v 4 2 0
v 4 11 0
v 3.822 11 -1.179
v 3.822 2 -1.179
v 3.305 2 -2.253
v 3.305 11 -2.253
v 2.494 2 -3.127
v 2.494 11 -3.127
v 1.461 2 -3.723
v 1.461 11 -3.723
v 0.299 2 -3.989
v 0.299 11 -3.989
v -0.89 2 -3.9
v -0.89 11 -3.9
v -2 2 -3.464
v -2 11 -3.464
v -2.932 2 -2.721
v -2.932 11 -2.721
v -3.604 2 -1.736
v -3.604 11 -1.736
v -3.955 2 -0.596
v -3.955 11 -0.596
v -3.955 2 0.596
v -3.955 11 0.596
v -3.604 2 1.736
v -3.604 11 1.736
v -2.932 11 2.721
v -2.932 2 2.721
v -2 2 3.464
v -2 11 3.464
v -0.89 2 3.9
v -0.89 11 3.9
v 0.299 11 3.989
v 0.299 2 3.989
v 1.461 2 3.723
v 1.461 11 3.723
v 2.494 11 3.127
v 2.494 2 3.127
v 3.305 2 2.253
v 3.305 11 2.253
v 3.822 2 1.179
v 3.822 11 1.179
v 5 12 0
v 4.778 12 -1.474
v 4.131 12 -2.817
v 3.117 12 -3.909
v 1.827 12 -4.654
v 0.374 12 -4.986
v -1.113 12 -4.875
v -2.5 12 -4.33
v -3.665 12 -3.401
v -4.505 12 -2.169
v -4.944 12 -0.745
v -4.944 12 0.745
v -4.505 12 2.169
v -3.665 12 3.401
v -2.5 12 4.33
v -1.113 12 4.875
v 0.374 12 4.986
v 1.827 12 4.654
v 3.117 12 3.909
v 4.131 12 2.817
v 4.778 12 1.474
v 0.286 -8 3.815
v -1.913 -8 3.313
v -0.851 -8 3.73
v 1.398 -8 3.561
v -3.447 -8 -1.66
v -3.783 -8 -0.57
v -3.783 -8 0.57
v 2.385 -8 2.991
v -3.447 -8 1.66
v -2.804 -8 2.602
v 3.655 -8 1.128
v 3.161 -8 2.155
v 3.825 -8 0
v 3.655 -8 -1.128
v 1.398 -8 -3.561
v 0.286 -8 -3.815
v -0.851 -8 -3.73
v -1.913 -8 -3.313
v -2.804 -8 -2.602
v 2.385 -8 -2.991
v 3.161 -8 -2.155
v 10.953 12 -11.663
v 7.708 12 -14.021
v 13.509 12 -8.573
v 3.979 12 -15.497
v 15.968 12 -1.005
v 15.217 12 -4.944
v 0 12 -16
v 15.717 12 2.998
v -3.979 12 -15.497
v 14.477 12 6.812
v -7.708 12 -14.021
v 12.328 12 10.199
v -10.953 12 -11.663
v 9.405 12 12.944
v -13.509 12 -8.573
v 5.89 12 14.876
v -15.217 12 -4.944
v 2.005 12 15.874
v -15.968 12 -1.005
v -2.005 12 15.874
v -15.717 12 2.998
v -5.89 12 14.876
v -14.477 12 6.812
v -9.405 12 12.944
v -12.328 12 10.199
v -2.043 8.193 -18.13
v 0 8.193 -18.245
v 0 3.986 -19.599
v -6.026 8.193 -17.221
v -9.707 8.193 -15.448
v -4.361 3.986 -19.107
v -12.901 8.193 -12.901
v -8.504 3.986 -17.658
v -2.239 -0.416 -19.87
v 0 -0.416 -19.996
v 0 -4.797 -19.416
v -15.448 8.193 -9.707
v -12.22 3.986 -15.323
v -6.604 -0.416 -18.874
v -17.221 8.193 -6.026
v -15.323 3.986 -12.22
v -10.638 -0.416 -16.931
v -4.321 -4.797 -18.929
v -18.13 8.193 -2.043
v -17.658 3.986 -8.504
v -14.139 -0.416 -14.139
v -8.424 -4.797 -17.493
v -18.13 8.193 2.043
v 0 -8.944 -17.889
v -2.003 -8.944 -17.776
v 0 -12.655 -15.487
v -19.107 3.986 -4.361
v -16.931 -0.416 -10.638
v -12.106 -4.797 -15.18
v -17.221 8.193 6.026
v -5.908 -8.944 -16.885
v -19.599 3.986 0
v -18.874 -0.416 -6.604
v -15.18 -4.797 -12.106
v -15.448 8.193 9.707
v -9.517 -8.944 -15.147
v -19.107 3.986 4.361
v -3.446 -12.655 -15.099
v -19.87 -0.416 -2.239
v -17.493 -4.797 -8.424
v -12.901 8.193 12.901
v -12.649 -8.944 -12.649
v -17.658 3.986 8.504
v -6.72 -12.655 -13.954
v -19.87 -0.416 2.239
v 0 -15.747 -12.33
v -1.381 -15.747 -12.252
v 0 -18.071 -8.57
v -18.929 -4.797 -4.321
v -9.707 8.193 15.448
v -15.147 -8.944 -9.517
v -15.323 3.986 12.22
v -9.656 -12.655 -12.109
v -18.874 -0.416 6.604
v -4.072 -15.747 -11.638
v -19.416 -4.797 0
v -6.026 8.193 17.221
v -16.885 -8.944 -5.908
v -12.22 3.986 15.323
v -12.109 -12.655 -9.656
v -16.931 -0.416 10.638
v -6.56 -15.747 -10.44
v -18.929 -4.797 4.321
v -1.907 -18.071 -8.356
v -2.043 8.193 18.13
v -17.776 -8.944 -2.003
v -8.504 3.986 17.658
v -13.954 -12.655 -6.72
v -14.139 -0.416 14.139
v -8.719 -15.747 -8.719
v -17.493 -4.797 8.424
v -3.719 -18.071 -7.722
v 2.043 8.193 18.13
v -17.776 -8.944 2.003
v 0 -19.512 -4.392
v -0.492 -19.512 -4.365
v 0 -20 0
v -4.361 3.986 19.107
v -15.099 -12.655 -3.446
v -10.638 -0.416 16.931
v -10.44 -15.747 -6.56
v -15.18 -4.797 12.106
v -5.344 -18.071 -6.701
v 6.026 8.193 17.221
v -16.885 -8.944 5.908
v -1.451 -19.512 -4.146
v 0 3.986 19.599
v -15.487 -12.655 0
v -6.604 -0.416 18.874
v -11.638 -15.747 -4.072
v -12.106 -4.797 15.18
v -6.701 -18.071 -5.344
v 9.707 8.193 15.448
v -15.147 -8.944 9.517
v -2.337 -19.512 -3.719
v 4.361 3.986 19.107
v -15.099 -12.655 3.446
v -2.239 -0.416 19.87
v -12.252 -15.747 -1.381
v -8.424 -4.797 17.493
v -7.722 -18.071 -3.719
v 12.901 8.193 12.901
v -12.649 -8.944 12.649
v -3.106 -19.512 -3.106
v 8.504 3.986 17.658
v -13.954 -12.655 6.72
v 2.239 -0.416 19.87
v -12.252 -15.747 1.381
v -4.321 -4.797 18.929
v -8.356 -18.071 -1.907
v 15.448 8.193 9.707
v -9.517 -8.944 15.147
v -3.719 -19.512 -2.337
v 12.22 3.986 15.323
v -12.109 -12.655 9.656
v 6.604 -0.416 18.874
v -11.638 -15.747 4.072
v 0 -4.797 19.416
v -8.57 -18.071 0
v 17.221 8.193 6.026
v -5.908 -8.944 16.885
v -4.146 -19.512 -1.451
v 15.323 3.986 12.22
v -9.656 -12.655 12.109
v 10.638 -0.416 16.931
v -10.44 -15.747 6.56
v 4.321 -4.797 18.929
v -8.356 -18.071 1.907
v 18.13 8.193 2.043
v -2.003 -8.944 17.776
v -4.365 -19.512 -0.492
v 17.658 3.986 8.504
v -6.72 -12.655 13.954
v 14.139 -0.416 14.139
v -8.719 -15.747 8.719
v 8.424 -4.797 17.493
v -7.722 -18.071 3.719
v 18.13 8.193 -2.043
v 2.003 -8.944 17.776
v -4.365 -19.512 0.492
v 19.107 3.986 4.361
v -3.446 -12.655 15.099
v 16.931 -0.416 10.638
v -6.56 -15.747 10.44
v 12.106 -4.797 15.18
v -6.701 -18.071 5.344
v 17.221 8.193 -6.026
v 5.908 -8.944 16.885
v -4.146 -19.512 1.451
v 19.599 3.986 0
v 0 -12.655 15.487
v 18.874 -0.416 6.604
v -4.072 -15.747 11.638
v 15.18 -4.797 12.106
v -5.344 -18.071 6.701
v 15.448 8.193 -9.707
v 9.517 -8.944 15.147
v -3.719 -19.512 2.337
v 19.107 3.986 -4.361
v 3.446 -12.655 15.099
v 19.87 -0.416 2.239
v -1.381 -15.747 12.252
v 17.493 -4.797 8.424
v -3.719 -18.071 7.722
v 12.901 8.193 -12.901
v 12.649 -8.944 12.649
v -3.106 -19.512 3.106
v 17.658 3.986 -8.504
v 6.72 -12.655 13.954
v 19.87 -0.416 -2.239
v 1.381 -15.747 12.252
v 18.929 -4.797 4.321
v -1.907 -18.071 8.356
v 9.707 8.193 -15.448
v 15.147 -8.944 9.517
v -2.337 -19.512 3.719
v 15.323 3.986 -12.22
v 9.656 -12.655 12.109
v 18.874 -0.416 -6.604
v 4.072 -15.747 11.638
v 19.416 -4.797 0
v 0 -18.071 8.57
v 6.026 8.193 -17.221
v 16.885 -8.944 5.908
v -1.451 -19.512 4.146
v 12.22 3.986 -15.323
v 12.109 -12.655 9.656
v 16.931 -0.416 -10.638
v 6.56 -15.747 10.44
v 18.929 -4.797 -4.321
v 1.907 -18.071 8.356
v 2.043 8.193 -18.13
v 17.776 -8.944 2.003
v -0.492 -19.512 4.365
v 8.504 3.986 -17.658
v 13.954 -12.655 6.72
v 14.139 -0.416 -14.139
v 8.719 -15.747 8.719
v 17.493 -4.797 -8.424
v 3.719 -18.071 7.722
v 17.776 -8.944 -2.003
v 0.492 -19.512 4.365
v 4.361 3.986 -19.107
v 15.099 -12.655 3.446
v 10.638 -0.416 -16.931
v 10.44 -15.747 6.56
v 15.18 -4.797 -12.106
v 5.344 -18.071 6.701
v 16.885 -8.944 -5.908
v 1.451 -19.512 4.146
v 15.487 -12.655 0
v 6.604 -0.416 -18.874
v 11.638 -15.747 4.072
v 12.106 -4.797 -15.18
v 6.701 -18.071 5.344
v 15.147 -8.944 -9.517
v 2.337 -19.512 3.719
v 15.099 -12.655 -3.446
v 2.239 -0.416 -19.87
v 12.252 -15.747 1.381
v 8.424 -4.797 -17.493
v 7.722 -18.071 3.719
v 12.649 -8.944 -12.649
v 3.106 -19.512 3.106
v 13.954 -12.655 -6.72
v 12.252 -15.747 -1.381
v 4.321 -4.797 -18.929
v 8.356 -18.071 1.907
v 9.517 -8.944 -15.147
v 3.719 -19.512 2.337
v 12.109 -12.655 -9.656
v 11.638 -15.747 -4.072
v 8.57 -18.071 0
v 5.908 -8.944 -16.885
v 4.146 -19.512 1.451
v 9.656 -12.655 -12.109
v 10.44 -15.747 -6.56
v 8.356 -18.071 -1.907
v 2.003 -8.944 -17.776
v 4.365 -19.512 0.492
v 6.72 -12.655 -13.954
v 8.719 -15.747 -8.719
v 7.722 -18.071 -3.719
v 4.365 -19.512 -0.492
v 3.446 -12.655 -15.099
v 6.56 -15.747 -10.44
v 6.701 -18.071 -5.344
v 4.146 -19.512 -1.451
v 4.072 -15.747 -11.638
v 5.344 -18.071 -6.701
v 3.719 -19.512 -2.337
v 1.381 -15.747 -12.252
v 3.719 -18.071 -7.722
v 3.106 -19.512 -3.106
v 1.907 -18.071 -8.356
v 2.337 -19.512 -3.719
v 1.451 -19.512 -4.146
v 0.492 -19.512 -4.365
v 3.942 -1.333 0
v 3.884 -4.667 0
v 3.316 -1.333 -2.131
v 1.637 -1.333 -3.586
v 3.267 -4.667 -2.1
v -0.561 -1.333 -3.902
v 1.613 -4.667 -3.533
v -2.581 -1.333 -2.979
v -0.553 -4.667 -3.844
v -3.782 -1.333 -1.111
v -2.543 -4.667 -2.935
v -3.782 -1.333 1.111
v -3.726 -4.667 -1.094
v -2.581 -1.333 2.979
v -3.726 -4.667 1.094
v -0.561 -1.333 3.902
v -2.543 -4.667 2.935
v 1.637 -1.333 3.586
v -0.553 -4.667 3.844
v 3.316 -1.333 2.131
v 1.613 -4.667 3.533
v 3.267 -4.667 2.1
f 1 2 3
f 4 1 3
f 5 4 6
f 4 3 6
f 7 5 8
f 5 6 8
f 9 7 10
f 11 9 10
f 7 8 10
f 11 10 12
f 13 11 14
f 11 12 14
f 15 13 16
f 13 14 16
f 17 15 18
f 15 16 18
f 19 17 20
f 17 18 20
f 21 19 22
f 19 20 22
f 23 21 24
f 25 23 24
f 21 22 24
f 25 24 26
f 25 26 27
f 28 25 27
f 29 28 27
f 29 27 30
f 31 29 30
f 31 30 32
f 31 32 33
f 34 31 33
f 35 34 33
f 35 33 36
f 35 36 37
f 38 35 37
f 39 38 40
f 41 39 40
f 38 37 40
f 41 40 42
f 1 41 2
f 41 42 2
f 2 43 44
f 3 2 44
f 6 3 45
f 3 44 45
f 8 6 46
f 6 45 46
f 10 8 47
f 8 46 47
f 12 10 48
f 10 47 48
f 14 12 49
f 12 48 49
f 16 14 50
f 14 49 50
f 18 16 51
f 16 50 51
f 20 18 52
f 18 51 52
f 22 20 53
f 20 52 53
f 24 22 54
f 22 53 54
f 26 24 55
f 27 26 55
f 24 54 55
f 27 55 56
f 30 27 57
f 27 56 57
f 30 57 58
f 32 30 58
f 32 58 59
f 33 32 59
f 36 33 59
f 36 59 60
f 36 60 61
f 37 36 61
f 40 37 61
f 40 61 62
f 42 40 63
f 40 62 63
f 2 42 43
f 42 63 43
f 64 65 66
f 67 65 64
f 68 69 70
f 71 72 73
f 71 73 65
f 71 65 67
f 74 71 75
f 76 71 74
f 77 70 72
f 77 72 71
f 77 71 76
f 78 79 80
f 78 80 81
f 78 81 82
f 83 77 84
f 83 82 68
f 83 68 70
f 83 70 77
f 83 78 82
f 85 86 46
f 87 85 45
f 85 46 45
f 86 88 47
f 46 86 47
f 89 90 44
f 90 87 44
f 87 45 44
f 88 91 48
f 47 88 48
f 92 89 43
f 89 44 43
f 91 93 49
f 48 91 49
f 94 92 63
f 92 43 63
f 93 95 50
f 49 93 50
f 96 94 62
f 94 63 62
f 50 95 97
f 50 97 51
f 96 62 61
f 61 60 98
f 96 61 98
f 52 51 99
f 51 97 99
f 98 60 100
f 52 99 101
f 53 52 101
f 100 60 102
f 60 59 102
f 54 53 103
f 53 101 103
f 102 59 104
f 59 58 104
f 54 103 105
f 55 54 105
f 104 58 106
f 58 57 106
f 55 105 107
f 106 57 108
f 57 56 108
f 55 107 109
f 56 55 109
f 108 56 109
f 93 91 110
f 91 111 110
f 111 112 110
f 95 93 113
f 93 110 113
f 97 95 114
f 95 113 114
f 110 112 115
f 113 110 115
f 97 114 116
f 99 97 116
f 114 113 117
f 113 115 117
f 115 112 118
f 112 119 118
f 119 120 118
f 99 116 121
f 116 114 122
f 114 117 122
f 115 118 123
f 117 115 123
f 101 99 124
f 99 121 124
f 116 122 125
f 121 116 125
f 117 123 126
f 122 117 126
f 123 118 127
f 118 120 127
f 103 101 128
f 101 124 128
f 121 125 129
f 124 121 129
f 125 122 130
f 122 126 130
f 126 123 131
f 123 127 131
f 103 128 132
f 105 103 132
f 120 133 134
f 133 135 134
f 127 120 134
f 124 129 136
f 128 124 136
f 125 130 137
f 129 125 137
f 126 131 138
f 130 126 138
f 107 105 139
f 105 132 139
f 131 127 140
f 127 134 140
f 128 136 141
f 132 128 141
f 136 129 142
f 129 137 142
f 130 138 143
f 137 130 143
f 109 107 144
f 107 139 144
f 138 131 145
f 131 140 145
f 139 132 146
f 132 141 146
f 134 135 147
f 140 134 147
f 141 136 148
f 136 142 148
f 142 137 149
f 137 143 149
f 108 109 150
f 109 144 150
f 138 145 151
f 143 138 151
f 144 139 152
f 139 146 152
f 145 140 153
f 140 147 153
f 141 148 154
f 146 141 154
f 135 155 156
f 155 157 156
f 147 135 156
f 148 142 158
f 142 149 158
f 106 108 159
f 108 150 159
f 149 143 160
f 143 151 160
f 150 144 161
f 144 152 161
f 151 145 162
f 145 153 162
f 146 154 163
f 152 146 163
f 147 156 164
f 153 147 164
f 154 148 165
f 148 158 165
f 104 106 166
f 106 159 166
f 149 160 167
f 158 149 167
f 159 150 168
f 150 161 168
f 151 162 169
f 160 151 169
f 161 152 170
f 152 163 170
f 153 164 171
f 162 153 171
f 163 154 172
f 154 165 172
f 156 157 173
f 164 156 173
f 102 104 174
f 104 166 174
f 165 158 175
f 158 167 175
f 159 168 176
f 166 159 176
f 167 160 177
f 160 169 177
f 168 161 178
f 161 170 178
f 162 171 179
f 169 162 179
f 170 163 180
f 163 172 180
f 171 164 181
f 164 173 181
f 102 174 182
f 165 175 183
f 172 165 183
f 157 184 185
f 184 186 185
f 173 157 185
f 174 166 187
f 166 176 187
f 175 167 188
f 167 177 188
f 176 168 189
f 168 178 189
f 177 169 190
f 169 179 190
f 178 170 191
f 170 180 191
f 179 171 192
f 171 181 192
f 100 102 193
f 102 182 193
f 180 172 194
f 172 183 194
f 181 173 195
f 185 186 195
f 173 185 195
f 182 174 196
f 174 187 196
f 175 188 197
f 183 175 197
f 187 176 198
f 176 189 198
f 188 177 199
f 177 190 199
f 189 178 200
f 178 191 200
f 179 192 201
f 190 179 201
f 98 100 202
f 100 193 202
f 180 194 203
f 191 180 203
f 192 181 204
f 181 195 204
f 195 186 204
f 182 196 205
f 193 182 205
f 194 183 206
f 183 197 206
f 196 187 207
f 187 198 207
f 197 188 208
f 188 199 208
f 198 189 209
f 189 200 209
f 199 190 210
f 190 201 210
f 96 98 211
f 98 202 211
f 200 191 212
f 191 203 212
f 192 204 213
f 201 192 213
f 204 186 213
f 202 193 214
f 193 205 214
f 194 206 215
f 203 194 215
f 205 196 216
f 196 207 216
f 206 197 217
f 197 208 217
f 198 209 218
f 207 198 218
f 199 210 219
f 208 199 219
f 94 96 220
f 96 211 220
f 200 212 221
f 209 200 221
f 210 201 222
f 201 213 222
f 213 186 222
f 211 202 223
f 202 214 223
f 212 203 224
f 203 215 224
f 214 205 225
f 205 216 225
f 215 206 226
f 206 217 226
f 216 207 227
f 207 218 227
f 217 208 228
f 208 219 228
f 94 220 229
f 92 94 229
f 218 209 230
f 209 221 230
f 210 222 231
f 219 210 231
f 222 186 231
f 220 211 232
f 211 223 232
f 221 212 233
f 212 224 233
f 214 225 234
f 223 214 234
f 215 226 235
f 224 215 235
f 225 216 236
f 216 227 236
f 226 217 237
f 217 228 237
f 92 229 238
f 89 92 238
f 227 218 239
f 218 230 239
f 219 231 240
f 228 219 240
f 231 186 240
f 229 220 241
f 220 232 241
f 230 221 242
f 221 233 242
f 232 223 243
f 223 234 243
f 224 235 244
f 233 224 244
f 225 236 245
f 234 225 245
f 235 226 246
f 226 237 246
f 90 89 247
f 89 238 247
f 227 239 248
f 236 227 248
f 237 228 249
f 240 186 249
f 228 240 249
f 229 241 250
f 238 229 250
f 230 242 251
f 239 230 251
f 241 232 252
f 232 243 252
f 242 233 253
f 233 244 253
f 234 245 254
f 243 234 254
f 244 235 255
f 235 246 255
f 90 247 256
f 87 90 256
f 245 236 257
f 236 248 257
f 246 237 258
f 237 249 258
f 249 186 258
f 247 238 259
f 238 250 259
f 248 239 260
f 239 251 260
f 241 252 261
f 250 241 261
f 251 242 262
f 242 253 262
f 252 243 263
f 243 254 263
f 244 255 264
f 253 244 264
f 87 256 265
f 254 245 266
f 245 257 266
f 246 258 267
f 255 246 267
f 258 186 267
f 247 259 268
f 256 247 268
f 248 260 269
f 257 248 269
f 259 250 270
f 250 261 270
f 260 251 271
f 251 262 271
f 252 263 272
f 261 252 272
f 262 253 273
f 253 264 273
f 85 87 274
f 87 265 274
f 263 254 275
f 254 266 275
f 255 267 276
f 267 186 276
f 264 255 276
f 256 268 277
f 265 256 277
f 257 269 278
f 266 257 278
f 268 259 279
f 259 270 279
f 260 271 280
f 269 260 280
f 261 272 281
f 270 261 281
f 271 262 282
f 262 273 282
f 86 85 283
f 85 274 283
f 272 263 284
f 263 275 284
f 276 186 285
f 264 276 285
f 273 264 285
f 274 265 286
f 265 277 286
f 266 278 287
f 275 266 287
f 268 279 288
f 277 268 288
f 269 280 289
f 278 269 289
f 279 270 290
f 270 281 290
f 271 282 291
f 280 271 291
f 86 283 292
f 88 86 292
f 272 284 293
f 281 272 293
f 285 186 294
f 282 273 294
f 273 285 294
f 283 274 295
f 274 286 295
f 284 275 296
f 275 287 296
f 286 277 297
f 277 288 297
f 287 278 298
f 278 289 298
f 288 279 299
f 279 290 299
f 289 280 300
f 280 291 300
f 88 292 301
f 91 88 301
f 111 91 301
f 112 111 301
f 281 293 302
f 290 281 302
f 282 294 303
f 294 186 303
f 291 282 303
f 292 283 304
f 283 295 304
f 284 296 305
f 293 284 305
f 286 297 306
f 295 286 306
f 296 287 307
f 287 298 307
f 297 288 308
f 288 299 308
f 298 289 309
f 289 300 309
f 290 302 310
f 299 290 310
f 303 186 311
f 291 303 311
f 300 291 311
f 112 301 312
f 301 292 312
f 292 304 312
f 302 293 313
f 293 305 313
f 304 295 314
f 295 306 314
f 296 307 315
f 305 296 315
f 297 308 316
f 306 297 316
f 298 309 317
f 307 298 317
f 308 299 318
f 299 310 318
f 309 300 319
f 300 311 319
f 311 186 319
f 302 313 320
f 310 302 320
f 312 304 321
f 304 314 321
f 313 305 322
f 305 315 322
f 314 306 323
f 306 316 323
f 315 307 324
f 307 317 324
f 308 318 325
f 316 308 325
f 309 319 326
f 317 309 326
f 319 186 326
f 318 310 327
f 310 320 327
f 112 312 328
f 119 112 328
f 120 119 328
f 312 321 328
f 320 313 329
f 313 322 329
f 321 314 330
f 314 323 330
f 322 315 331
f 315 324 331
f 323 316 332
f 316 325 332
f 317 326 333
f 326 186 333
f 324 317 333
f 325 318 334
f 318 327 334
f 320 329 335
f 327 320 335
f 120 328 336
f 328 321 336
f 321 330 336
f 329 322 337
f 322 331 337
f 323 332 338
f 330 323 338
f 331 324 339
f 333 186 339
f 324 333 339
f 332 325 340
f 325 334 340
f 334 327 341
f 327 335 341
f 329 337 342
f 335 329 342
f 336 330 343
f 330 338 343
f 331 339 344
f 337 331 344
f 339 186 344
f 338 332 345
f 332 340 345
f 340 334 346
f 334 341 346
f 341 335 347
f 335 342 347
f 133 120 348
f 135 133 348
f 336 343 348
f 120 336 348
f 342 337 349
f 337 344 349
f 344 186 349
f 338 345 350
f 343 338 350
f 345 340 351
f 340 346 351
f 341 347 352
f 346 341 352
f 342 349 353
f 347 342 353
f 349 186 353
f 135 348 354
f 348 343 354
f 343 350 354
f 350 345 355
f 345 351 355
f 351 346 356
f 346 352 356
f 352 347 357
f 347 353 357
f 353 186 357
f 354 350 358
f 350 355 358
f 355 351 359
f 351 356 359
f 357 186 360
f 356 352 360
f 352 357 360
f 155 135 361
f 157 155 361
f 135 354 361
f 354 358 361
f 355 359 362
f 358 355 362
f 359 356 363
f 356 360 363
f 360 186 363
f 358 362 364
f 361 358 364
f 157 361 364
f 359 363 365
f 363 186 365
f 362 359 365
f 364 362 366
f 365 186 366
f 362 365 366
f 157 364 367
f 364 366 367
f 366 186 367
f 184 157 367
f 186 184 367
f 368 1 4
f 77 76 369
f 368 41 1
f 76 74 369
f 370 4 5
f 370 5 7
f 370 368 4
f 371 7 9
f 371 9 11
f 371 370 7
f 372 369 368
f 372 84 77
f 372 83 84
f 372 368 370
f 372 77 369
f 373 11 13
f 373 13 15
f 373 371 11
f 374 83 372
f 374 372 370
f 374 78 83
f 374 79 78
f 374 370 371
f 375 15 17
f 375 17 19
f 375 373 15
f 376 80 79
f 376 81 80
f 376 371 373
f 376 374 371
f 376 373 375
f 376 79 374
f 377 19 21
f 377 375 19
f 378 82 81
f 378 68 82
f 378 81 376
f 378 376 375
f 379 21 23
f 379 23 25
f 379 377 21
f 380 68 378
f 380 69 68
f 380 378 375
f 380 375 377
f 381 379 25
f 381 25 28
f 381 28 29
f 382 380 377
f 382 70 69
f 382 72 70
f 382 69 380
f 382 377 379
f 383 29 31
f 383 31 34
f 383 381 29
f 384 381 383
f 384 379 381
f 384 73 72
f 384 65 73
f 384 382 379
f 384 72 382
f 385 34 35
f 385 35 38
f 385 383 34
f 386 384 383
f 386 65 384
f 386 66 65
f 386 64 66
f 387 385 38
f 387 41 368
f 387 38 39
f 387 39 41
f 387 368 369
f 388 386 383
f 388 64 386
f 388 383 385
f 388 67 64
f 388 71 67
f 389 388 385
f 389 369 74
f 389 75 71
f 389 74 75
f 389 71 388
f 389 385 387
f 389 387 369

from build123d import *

# Parameters (mm, degrees)
SKETCH2_R          = 4
CUT_EXTRUDE1_DEPTH = 20
CHAMFER1_SIZE      = 10
CHAMFER1_SIZE2     = 0.174550649
CHAMFER2_SIZE      = 1


with BuildPart() as part:
    # Sketch1 → Revolve2 (revolve)
    with BuildSketch(Plane(origin=(0, 0, 0), x_dir=(0, 0, -1), z_dir=(1, 0, 0))):
        with BuildLine():
            Line((0, 12), (16, 12))
            ThreePointArc((16, 12), (17.88854382, -8.94427191), (0, -20))
            Line((0, -20), (0, 12))
        make_face()
    revolve(axis=Axis((0, -20, 0), (0, 1, 0)))

    # Sketch2 → Cut-Extrude1 (cut)
    with BuildSketch(Plane(origin=(0, 12, 0), x_dir=(1, 0, 0), z_dir=(0, 1, 0))):
        Circle(SKETCH2_R)
    extrude(amount=-CUT_EXTRUDE1_DEPTH, mode=Mode.SUBTRACT)

    # Chamfer1
    chamfer1_edges = [part.edges().sort_by_distance(p)[0] for p in [
        (-4, -8, 0),
    ]]
    chamfer1_side = [part.faces().sort_by_distance(p)[0] for p in [
        (-4, 2, 0),
    ]]
    chamfer(chamfer1_edges, length=CHAMFER1_SIZE, length2=CHAMFER1_SIZE2, reference=chamfer1_side[0])

    # Chamfer2
    chamfer2_edges = [part.edges().sort_by_distance(p)[0] for p in [
        (-4, 12, 0),
    ]]
    chamfer(chamfer2_edges, length=CHAMFER2_SIZE)


solid = part.part
